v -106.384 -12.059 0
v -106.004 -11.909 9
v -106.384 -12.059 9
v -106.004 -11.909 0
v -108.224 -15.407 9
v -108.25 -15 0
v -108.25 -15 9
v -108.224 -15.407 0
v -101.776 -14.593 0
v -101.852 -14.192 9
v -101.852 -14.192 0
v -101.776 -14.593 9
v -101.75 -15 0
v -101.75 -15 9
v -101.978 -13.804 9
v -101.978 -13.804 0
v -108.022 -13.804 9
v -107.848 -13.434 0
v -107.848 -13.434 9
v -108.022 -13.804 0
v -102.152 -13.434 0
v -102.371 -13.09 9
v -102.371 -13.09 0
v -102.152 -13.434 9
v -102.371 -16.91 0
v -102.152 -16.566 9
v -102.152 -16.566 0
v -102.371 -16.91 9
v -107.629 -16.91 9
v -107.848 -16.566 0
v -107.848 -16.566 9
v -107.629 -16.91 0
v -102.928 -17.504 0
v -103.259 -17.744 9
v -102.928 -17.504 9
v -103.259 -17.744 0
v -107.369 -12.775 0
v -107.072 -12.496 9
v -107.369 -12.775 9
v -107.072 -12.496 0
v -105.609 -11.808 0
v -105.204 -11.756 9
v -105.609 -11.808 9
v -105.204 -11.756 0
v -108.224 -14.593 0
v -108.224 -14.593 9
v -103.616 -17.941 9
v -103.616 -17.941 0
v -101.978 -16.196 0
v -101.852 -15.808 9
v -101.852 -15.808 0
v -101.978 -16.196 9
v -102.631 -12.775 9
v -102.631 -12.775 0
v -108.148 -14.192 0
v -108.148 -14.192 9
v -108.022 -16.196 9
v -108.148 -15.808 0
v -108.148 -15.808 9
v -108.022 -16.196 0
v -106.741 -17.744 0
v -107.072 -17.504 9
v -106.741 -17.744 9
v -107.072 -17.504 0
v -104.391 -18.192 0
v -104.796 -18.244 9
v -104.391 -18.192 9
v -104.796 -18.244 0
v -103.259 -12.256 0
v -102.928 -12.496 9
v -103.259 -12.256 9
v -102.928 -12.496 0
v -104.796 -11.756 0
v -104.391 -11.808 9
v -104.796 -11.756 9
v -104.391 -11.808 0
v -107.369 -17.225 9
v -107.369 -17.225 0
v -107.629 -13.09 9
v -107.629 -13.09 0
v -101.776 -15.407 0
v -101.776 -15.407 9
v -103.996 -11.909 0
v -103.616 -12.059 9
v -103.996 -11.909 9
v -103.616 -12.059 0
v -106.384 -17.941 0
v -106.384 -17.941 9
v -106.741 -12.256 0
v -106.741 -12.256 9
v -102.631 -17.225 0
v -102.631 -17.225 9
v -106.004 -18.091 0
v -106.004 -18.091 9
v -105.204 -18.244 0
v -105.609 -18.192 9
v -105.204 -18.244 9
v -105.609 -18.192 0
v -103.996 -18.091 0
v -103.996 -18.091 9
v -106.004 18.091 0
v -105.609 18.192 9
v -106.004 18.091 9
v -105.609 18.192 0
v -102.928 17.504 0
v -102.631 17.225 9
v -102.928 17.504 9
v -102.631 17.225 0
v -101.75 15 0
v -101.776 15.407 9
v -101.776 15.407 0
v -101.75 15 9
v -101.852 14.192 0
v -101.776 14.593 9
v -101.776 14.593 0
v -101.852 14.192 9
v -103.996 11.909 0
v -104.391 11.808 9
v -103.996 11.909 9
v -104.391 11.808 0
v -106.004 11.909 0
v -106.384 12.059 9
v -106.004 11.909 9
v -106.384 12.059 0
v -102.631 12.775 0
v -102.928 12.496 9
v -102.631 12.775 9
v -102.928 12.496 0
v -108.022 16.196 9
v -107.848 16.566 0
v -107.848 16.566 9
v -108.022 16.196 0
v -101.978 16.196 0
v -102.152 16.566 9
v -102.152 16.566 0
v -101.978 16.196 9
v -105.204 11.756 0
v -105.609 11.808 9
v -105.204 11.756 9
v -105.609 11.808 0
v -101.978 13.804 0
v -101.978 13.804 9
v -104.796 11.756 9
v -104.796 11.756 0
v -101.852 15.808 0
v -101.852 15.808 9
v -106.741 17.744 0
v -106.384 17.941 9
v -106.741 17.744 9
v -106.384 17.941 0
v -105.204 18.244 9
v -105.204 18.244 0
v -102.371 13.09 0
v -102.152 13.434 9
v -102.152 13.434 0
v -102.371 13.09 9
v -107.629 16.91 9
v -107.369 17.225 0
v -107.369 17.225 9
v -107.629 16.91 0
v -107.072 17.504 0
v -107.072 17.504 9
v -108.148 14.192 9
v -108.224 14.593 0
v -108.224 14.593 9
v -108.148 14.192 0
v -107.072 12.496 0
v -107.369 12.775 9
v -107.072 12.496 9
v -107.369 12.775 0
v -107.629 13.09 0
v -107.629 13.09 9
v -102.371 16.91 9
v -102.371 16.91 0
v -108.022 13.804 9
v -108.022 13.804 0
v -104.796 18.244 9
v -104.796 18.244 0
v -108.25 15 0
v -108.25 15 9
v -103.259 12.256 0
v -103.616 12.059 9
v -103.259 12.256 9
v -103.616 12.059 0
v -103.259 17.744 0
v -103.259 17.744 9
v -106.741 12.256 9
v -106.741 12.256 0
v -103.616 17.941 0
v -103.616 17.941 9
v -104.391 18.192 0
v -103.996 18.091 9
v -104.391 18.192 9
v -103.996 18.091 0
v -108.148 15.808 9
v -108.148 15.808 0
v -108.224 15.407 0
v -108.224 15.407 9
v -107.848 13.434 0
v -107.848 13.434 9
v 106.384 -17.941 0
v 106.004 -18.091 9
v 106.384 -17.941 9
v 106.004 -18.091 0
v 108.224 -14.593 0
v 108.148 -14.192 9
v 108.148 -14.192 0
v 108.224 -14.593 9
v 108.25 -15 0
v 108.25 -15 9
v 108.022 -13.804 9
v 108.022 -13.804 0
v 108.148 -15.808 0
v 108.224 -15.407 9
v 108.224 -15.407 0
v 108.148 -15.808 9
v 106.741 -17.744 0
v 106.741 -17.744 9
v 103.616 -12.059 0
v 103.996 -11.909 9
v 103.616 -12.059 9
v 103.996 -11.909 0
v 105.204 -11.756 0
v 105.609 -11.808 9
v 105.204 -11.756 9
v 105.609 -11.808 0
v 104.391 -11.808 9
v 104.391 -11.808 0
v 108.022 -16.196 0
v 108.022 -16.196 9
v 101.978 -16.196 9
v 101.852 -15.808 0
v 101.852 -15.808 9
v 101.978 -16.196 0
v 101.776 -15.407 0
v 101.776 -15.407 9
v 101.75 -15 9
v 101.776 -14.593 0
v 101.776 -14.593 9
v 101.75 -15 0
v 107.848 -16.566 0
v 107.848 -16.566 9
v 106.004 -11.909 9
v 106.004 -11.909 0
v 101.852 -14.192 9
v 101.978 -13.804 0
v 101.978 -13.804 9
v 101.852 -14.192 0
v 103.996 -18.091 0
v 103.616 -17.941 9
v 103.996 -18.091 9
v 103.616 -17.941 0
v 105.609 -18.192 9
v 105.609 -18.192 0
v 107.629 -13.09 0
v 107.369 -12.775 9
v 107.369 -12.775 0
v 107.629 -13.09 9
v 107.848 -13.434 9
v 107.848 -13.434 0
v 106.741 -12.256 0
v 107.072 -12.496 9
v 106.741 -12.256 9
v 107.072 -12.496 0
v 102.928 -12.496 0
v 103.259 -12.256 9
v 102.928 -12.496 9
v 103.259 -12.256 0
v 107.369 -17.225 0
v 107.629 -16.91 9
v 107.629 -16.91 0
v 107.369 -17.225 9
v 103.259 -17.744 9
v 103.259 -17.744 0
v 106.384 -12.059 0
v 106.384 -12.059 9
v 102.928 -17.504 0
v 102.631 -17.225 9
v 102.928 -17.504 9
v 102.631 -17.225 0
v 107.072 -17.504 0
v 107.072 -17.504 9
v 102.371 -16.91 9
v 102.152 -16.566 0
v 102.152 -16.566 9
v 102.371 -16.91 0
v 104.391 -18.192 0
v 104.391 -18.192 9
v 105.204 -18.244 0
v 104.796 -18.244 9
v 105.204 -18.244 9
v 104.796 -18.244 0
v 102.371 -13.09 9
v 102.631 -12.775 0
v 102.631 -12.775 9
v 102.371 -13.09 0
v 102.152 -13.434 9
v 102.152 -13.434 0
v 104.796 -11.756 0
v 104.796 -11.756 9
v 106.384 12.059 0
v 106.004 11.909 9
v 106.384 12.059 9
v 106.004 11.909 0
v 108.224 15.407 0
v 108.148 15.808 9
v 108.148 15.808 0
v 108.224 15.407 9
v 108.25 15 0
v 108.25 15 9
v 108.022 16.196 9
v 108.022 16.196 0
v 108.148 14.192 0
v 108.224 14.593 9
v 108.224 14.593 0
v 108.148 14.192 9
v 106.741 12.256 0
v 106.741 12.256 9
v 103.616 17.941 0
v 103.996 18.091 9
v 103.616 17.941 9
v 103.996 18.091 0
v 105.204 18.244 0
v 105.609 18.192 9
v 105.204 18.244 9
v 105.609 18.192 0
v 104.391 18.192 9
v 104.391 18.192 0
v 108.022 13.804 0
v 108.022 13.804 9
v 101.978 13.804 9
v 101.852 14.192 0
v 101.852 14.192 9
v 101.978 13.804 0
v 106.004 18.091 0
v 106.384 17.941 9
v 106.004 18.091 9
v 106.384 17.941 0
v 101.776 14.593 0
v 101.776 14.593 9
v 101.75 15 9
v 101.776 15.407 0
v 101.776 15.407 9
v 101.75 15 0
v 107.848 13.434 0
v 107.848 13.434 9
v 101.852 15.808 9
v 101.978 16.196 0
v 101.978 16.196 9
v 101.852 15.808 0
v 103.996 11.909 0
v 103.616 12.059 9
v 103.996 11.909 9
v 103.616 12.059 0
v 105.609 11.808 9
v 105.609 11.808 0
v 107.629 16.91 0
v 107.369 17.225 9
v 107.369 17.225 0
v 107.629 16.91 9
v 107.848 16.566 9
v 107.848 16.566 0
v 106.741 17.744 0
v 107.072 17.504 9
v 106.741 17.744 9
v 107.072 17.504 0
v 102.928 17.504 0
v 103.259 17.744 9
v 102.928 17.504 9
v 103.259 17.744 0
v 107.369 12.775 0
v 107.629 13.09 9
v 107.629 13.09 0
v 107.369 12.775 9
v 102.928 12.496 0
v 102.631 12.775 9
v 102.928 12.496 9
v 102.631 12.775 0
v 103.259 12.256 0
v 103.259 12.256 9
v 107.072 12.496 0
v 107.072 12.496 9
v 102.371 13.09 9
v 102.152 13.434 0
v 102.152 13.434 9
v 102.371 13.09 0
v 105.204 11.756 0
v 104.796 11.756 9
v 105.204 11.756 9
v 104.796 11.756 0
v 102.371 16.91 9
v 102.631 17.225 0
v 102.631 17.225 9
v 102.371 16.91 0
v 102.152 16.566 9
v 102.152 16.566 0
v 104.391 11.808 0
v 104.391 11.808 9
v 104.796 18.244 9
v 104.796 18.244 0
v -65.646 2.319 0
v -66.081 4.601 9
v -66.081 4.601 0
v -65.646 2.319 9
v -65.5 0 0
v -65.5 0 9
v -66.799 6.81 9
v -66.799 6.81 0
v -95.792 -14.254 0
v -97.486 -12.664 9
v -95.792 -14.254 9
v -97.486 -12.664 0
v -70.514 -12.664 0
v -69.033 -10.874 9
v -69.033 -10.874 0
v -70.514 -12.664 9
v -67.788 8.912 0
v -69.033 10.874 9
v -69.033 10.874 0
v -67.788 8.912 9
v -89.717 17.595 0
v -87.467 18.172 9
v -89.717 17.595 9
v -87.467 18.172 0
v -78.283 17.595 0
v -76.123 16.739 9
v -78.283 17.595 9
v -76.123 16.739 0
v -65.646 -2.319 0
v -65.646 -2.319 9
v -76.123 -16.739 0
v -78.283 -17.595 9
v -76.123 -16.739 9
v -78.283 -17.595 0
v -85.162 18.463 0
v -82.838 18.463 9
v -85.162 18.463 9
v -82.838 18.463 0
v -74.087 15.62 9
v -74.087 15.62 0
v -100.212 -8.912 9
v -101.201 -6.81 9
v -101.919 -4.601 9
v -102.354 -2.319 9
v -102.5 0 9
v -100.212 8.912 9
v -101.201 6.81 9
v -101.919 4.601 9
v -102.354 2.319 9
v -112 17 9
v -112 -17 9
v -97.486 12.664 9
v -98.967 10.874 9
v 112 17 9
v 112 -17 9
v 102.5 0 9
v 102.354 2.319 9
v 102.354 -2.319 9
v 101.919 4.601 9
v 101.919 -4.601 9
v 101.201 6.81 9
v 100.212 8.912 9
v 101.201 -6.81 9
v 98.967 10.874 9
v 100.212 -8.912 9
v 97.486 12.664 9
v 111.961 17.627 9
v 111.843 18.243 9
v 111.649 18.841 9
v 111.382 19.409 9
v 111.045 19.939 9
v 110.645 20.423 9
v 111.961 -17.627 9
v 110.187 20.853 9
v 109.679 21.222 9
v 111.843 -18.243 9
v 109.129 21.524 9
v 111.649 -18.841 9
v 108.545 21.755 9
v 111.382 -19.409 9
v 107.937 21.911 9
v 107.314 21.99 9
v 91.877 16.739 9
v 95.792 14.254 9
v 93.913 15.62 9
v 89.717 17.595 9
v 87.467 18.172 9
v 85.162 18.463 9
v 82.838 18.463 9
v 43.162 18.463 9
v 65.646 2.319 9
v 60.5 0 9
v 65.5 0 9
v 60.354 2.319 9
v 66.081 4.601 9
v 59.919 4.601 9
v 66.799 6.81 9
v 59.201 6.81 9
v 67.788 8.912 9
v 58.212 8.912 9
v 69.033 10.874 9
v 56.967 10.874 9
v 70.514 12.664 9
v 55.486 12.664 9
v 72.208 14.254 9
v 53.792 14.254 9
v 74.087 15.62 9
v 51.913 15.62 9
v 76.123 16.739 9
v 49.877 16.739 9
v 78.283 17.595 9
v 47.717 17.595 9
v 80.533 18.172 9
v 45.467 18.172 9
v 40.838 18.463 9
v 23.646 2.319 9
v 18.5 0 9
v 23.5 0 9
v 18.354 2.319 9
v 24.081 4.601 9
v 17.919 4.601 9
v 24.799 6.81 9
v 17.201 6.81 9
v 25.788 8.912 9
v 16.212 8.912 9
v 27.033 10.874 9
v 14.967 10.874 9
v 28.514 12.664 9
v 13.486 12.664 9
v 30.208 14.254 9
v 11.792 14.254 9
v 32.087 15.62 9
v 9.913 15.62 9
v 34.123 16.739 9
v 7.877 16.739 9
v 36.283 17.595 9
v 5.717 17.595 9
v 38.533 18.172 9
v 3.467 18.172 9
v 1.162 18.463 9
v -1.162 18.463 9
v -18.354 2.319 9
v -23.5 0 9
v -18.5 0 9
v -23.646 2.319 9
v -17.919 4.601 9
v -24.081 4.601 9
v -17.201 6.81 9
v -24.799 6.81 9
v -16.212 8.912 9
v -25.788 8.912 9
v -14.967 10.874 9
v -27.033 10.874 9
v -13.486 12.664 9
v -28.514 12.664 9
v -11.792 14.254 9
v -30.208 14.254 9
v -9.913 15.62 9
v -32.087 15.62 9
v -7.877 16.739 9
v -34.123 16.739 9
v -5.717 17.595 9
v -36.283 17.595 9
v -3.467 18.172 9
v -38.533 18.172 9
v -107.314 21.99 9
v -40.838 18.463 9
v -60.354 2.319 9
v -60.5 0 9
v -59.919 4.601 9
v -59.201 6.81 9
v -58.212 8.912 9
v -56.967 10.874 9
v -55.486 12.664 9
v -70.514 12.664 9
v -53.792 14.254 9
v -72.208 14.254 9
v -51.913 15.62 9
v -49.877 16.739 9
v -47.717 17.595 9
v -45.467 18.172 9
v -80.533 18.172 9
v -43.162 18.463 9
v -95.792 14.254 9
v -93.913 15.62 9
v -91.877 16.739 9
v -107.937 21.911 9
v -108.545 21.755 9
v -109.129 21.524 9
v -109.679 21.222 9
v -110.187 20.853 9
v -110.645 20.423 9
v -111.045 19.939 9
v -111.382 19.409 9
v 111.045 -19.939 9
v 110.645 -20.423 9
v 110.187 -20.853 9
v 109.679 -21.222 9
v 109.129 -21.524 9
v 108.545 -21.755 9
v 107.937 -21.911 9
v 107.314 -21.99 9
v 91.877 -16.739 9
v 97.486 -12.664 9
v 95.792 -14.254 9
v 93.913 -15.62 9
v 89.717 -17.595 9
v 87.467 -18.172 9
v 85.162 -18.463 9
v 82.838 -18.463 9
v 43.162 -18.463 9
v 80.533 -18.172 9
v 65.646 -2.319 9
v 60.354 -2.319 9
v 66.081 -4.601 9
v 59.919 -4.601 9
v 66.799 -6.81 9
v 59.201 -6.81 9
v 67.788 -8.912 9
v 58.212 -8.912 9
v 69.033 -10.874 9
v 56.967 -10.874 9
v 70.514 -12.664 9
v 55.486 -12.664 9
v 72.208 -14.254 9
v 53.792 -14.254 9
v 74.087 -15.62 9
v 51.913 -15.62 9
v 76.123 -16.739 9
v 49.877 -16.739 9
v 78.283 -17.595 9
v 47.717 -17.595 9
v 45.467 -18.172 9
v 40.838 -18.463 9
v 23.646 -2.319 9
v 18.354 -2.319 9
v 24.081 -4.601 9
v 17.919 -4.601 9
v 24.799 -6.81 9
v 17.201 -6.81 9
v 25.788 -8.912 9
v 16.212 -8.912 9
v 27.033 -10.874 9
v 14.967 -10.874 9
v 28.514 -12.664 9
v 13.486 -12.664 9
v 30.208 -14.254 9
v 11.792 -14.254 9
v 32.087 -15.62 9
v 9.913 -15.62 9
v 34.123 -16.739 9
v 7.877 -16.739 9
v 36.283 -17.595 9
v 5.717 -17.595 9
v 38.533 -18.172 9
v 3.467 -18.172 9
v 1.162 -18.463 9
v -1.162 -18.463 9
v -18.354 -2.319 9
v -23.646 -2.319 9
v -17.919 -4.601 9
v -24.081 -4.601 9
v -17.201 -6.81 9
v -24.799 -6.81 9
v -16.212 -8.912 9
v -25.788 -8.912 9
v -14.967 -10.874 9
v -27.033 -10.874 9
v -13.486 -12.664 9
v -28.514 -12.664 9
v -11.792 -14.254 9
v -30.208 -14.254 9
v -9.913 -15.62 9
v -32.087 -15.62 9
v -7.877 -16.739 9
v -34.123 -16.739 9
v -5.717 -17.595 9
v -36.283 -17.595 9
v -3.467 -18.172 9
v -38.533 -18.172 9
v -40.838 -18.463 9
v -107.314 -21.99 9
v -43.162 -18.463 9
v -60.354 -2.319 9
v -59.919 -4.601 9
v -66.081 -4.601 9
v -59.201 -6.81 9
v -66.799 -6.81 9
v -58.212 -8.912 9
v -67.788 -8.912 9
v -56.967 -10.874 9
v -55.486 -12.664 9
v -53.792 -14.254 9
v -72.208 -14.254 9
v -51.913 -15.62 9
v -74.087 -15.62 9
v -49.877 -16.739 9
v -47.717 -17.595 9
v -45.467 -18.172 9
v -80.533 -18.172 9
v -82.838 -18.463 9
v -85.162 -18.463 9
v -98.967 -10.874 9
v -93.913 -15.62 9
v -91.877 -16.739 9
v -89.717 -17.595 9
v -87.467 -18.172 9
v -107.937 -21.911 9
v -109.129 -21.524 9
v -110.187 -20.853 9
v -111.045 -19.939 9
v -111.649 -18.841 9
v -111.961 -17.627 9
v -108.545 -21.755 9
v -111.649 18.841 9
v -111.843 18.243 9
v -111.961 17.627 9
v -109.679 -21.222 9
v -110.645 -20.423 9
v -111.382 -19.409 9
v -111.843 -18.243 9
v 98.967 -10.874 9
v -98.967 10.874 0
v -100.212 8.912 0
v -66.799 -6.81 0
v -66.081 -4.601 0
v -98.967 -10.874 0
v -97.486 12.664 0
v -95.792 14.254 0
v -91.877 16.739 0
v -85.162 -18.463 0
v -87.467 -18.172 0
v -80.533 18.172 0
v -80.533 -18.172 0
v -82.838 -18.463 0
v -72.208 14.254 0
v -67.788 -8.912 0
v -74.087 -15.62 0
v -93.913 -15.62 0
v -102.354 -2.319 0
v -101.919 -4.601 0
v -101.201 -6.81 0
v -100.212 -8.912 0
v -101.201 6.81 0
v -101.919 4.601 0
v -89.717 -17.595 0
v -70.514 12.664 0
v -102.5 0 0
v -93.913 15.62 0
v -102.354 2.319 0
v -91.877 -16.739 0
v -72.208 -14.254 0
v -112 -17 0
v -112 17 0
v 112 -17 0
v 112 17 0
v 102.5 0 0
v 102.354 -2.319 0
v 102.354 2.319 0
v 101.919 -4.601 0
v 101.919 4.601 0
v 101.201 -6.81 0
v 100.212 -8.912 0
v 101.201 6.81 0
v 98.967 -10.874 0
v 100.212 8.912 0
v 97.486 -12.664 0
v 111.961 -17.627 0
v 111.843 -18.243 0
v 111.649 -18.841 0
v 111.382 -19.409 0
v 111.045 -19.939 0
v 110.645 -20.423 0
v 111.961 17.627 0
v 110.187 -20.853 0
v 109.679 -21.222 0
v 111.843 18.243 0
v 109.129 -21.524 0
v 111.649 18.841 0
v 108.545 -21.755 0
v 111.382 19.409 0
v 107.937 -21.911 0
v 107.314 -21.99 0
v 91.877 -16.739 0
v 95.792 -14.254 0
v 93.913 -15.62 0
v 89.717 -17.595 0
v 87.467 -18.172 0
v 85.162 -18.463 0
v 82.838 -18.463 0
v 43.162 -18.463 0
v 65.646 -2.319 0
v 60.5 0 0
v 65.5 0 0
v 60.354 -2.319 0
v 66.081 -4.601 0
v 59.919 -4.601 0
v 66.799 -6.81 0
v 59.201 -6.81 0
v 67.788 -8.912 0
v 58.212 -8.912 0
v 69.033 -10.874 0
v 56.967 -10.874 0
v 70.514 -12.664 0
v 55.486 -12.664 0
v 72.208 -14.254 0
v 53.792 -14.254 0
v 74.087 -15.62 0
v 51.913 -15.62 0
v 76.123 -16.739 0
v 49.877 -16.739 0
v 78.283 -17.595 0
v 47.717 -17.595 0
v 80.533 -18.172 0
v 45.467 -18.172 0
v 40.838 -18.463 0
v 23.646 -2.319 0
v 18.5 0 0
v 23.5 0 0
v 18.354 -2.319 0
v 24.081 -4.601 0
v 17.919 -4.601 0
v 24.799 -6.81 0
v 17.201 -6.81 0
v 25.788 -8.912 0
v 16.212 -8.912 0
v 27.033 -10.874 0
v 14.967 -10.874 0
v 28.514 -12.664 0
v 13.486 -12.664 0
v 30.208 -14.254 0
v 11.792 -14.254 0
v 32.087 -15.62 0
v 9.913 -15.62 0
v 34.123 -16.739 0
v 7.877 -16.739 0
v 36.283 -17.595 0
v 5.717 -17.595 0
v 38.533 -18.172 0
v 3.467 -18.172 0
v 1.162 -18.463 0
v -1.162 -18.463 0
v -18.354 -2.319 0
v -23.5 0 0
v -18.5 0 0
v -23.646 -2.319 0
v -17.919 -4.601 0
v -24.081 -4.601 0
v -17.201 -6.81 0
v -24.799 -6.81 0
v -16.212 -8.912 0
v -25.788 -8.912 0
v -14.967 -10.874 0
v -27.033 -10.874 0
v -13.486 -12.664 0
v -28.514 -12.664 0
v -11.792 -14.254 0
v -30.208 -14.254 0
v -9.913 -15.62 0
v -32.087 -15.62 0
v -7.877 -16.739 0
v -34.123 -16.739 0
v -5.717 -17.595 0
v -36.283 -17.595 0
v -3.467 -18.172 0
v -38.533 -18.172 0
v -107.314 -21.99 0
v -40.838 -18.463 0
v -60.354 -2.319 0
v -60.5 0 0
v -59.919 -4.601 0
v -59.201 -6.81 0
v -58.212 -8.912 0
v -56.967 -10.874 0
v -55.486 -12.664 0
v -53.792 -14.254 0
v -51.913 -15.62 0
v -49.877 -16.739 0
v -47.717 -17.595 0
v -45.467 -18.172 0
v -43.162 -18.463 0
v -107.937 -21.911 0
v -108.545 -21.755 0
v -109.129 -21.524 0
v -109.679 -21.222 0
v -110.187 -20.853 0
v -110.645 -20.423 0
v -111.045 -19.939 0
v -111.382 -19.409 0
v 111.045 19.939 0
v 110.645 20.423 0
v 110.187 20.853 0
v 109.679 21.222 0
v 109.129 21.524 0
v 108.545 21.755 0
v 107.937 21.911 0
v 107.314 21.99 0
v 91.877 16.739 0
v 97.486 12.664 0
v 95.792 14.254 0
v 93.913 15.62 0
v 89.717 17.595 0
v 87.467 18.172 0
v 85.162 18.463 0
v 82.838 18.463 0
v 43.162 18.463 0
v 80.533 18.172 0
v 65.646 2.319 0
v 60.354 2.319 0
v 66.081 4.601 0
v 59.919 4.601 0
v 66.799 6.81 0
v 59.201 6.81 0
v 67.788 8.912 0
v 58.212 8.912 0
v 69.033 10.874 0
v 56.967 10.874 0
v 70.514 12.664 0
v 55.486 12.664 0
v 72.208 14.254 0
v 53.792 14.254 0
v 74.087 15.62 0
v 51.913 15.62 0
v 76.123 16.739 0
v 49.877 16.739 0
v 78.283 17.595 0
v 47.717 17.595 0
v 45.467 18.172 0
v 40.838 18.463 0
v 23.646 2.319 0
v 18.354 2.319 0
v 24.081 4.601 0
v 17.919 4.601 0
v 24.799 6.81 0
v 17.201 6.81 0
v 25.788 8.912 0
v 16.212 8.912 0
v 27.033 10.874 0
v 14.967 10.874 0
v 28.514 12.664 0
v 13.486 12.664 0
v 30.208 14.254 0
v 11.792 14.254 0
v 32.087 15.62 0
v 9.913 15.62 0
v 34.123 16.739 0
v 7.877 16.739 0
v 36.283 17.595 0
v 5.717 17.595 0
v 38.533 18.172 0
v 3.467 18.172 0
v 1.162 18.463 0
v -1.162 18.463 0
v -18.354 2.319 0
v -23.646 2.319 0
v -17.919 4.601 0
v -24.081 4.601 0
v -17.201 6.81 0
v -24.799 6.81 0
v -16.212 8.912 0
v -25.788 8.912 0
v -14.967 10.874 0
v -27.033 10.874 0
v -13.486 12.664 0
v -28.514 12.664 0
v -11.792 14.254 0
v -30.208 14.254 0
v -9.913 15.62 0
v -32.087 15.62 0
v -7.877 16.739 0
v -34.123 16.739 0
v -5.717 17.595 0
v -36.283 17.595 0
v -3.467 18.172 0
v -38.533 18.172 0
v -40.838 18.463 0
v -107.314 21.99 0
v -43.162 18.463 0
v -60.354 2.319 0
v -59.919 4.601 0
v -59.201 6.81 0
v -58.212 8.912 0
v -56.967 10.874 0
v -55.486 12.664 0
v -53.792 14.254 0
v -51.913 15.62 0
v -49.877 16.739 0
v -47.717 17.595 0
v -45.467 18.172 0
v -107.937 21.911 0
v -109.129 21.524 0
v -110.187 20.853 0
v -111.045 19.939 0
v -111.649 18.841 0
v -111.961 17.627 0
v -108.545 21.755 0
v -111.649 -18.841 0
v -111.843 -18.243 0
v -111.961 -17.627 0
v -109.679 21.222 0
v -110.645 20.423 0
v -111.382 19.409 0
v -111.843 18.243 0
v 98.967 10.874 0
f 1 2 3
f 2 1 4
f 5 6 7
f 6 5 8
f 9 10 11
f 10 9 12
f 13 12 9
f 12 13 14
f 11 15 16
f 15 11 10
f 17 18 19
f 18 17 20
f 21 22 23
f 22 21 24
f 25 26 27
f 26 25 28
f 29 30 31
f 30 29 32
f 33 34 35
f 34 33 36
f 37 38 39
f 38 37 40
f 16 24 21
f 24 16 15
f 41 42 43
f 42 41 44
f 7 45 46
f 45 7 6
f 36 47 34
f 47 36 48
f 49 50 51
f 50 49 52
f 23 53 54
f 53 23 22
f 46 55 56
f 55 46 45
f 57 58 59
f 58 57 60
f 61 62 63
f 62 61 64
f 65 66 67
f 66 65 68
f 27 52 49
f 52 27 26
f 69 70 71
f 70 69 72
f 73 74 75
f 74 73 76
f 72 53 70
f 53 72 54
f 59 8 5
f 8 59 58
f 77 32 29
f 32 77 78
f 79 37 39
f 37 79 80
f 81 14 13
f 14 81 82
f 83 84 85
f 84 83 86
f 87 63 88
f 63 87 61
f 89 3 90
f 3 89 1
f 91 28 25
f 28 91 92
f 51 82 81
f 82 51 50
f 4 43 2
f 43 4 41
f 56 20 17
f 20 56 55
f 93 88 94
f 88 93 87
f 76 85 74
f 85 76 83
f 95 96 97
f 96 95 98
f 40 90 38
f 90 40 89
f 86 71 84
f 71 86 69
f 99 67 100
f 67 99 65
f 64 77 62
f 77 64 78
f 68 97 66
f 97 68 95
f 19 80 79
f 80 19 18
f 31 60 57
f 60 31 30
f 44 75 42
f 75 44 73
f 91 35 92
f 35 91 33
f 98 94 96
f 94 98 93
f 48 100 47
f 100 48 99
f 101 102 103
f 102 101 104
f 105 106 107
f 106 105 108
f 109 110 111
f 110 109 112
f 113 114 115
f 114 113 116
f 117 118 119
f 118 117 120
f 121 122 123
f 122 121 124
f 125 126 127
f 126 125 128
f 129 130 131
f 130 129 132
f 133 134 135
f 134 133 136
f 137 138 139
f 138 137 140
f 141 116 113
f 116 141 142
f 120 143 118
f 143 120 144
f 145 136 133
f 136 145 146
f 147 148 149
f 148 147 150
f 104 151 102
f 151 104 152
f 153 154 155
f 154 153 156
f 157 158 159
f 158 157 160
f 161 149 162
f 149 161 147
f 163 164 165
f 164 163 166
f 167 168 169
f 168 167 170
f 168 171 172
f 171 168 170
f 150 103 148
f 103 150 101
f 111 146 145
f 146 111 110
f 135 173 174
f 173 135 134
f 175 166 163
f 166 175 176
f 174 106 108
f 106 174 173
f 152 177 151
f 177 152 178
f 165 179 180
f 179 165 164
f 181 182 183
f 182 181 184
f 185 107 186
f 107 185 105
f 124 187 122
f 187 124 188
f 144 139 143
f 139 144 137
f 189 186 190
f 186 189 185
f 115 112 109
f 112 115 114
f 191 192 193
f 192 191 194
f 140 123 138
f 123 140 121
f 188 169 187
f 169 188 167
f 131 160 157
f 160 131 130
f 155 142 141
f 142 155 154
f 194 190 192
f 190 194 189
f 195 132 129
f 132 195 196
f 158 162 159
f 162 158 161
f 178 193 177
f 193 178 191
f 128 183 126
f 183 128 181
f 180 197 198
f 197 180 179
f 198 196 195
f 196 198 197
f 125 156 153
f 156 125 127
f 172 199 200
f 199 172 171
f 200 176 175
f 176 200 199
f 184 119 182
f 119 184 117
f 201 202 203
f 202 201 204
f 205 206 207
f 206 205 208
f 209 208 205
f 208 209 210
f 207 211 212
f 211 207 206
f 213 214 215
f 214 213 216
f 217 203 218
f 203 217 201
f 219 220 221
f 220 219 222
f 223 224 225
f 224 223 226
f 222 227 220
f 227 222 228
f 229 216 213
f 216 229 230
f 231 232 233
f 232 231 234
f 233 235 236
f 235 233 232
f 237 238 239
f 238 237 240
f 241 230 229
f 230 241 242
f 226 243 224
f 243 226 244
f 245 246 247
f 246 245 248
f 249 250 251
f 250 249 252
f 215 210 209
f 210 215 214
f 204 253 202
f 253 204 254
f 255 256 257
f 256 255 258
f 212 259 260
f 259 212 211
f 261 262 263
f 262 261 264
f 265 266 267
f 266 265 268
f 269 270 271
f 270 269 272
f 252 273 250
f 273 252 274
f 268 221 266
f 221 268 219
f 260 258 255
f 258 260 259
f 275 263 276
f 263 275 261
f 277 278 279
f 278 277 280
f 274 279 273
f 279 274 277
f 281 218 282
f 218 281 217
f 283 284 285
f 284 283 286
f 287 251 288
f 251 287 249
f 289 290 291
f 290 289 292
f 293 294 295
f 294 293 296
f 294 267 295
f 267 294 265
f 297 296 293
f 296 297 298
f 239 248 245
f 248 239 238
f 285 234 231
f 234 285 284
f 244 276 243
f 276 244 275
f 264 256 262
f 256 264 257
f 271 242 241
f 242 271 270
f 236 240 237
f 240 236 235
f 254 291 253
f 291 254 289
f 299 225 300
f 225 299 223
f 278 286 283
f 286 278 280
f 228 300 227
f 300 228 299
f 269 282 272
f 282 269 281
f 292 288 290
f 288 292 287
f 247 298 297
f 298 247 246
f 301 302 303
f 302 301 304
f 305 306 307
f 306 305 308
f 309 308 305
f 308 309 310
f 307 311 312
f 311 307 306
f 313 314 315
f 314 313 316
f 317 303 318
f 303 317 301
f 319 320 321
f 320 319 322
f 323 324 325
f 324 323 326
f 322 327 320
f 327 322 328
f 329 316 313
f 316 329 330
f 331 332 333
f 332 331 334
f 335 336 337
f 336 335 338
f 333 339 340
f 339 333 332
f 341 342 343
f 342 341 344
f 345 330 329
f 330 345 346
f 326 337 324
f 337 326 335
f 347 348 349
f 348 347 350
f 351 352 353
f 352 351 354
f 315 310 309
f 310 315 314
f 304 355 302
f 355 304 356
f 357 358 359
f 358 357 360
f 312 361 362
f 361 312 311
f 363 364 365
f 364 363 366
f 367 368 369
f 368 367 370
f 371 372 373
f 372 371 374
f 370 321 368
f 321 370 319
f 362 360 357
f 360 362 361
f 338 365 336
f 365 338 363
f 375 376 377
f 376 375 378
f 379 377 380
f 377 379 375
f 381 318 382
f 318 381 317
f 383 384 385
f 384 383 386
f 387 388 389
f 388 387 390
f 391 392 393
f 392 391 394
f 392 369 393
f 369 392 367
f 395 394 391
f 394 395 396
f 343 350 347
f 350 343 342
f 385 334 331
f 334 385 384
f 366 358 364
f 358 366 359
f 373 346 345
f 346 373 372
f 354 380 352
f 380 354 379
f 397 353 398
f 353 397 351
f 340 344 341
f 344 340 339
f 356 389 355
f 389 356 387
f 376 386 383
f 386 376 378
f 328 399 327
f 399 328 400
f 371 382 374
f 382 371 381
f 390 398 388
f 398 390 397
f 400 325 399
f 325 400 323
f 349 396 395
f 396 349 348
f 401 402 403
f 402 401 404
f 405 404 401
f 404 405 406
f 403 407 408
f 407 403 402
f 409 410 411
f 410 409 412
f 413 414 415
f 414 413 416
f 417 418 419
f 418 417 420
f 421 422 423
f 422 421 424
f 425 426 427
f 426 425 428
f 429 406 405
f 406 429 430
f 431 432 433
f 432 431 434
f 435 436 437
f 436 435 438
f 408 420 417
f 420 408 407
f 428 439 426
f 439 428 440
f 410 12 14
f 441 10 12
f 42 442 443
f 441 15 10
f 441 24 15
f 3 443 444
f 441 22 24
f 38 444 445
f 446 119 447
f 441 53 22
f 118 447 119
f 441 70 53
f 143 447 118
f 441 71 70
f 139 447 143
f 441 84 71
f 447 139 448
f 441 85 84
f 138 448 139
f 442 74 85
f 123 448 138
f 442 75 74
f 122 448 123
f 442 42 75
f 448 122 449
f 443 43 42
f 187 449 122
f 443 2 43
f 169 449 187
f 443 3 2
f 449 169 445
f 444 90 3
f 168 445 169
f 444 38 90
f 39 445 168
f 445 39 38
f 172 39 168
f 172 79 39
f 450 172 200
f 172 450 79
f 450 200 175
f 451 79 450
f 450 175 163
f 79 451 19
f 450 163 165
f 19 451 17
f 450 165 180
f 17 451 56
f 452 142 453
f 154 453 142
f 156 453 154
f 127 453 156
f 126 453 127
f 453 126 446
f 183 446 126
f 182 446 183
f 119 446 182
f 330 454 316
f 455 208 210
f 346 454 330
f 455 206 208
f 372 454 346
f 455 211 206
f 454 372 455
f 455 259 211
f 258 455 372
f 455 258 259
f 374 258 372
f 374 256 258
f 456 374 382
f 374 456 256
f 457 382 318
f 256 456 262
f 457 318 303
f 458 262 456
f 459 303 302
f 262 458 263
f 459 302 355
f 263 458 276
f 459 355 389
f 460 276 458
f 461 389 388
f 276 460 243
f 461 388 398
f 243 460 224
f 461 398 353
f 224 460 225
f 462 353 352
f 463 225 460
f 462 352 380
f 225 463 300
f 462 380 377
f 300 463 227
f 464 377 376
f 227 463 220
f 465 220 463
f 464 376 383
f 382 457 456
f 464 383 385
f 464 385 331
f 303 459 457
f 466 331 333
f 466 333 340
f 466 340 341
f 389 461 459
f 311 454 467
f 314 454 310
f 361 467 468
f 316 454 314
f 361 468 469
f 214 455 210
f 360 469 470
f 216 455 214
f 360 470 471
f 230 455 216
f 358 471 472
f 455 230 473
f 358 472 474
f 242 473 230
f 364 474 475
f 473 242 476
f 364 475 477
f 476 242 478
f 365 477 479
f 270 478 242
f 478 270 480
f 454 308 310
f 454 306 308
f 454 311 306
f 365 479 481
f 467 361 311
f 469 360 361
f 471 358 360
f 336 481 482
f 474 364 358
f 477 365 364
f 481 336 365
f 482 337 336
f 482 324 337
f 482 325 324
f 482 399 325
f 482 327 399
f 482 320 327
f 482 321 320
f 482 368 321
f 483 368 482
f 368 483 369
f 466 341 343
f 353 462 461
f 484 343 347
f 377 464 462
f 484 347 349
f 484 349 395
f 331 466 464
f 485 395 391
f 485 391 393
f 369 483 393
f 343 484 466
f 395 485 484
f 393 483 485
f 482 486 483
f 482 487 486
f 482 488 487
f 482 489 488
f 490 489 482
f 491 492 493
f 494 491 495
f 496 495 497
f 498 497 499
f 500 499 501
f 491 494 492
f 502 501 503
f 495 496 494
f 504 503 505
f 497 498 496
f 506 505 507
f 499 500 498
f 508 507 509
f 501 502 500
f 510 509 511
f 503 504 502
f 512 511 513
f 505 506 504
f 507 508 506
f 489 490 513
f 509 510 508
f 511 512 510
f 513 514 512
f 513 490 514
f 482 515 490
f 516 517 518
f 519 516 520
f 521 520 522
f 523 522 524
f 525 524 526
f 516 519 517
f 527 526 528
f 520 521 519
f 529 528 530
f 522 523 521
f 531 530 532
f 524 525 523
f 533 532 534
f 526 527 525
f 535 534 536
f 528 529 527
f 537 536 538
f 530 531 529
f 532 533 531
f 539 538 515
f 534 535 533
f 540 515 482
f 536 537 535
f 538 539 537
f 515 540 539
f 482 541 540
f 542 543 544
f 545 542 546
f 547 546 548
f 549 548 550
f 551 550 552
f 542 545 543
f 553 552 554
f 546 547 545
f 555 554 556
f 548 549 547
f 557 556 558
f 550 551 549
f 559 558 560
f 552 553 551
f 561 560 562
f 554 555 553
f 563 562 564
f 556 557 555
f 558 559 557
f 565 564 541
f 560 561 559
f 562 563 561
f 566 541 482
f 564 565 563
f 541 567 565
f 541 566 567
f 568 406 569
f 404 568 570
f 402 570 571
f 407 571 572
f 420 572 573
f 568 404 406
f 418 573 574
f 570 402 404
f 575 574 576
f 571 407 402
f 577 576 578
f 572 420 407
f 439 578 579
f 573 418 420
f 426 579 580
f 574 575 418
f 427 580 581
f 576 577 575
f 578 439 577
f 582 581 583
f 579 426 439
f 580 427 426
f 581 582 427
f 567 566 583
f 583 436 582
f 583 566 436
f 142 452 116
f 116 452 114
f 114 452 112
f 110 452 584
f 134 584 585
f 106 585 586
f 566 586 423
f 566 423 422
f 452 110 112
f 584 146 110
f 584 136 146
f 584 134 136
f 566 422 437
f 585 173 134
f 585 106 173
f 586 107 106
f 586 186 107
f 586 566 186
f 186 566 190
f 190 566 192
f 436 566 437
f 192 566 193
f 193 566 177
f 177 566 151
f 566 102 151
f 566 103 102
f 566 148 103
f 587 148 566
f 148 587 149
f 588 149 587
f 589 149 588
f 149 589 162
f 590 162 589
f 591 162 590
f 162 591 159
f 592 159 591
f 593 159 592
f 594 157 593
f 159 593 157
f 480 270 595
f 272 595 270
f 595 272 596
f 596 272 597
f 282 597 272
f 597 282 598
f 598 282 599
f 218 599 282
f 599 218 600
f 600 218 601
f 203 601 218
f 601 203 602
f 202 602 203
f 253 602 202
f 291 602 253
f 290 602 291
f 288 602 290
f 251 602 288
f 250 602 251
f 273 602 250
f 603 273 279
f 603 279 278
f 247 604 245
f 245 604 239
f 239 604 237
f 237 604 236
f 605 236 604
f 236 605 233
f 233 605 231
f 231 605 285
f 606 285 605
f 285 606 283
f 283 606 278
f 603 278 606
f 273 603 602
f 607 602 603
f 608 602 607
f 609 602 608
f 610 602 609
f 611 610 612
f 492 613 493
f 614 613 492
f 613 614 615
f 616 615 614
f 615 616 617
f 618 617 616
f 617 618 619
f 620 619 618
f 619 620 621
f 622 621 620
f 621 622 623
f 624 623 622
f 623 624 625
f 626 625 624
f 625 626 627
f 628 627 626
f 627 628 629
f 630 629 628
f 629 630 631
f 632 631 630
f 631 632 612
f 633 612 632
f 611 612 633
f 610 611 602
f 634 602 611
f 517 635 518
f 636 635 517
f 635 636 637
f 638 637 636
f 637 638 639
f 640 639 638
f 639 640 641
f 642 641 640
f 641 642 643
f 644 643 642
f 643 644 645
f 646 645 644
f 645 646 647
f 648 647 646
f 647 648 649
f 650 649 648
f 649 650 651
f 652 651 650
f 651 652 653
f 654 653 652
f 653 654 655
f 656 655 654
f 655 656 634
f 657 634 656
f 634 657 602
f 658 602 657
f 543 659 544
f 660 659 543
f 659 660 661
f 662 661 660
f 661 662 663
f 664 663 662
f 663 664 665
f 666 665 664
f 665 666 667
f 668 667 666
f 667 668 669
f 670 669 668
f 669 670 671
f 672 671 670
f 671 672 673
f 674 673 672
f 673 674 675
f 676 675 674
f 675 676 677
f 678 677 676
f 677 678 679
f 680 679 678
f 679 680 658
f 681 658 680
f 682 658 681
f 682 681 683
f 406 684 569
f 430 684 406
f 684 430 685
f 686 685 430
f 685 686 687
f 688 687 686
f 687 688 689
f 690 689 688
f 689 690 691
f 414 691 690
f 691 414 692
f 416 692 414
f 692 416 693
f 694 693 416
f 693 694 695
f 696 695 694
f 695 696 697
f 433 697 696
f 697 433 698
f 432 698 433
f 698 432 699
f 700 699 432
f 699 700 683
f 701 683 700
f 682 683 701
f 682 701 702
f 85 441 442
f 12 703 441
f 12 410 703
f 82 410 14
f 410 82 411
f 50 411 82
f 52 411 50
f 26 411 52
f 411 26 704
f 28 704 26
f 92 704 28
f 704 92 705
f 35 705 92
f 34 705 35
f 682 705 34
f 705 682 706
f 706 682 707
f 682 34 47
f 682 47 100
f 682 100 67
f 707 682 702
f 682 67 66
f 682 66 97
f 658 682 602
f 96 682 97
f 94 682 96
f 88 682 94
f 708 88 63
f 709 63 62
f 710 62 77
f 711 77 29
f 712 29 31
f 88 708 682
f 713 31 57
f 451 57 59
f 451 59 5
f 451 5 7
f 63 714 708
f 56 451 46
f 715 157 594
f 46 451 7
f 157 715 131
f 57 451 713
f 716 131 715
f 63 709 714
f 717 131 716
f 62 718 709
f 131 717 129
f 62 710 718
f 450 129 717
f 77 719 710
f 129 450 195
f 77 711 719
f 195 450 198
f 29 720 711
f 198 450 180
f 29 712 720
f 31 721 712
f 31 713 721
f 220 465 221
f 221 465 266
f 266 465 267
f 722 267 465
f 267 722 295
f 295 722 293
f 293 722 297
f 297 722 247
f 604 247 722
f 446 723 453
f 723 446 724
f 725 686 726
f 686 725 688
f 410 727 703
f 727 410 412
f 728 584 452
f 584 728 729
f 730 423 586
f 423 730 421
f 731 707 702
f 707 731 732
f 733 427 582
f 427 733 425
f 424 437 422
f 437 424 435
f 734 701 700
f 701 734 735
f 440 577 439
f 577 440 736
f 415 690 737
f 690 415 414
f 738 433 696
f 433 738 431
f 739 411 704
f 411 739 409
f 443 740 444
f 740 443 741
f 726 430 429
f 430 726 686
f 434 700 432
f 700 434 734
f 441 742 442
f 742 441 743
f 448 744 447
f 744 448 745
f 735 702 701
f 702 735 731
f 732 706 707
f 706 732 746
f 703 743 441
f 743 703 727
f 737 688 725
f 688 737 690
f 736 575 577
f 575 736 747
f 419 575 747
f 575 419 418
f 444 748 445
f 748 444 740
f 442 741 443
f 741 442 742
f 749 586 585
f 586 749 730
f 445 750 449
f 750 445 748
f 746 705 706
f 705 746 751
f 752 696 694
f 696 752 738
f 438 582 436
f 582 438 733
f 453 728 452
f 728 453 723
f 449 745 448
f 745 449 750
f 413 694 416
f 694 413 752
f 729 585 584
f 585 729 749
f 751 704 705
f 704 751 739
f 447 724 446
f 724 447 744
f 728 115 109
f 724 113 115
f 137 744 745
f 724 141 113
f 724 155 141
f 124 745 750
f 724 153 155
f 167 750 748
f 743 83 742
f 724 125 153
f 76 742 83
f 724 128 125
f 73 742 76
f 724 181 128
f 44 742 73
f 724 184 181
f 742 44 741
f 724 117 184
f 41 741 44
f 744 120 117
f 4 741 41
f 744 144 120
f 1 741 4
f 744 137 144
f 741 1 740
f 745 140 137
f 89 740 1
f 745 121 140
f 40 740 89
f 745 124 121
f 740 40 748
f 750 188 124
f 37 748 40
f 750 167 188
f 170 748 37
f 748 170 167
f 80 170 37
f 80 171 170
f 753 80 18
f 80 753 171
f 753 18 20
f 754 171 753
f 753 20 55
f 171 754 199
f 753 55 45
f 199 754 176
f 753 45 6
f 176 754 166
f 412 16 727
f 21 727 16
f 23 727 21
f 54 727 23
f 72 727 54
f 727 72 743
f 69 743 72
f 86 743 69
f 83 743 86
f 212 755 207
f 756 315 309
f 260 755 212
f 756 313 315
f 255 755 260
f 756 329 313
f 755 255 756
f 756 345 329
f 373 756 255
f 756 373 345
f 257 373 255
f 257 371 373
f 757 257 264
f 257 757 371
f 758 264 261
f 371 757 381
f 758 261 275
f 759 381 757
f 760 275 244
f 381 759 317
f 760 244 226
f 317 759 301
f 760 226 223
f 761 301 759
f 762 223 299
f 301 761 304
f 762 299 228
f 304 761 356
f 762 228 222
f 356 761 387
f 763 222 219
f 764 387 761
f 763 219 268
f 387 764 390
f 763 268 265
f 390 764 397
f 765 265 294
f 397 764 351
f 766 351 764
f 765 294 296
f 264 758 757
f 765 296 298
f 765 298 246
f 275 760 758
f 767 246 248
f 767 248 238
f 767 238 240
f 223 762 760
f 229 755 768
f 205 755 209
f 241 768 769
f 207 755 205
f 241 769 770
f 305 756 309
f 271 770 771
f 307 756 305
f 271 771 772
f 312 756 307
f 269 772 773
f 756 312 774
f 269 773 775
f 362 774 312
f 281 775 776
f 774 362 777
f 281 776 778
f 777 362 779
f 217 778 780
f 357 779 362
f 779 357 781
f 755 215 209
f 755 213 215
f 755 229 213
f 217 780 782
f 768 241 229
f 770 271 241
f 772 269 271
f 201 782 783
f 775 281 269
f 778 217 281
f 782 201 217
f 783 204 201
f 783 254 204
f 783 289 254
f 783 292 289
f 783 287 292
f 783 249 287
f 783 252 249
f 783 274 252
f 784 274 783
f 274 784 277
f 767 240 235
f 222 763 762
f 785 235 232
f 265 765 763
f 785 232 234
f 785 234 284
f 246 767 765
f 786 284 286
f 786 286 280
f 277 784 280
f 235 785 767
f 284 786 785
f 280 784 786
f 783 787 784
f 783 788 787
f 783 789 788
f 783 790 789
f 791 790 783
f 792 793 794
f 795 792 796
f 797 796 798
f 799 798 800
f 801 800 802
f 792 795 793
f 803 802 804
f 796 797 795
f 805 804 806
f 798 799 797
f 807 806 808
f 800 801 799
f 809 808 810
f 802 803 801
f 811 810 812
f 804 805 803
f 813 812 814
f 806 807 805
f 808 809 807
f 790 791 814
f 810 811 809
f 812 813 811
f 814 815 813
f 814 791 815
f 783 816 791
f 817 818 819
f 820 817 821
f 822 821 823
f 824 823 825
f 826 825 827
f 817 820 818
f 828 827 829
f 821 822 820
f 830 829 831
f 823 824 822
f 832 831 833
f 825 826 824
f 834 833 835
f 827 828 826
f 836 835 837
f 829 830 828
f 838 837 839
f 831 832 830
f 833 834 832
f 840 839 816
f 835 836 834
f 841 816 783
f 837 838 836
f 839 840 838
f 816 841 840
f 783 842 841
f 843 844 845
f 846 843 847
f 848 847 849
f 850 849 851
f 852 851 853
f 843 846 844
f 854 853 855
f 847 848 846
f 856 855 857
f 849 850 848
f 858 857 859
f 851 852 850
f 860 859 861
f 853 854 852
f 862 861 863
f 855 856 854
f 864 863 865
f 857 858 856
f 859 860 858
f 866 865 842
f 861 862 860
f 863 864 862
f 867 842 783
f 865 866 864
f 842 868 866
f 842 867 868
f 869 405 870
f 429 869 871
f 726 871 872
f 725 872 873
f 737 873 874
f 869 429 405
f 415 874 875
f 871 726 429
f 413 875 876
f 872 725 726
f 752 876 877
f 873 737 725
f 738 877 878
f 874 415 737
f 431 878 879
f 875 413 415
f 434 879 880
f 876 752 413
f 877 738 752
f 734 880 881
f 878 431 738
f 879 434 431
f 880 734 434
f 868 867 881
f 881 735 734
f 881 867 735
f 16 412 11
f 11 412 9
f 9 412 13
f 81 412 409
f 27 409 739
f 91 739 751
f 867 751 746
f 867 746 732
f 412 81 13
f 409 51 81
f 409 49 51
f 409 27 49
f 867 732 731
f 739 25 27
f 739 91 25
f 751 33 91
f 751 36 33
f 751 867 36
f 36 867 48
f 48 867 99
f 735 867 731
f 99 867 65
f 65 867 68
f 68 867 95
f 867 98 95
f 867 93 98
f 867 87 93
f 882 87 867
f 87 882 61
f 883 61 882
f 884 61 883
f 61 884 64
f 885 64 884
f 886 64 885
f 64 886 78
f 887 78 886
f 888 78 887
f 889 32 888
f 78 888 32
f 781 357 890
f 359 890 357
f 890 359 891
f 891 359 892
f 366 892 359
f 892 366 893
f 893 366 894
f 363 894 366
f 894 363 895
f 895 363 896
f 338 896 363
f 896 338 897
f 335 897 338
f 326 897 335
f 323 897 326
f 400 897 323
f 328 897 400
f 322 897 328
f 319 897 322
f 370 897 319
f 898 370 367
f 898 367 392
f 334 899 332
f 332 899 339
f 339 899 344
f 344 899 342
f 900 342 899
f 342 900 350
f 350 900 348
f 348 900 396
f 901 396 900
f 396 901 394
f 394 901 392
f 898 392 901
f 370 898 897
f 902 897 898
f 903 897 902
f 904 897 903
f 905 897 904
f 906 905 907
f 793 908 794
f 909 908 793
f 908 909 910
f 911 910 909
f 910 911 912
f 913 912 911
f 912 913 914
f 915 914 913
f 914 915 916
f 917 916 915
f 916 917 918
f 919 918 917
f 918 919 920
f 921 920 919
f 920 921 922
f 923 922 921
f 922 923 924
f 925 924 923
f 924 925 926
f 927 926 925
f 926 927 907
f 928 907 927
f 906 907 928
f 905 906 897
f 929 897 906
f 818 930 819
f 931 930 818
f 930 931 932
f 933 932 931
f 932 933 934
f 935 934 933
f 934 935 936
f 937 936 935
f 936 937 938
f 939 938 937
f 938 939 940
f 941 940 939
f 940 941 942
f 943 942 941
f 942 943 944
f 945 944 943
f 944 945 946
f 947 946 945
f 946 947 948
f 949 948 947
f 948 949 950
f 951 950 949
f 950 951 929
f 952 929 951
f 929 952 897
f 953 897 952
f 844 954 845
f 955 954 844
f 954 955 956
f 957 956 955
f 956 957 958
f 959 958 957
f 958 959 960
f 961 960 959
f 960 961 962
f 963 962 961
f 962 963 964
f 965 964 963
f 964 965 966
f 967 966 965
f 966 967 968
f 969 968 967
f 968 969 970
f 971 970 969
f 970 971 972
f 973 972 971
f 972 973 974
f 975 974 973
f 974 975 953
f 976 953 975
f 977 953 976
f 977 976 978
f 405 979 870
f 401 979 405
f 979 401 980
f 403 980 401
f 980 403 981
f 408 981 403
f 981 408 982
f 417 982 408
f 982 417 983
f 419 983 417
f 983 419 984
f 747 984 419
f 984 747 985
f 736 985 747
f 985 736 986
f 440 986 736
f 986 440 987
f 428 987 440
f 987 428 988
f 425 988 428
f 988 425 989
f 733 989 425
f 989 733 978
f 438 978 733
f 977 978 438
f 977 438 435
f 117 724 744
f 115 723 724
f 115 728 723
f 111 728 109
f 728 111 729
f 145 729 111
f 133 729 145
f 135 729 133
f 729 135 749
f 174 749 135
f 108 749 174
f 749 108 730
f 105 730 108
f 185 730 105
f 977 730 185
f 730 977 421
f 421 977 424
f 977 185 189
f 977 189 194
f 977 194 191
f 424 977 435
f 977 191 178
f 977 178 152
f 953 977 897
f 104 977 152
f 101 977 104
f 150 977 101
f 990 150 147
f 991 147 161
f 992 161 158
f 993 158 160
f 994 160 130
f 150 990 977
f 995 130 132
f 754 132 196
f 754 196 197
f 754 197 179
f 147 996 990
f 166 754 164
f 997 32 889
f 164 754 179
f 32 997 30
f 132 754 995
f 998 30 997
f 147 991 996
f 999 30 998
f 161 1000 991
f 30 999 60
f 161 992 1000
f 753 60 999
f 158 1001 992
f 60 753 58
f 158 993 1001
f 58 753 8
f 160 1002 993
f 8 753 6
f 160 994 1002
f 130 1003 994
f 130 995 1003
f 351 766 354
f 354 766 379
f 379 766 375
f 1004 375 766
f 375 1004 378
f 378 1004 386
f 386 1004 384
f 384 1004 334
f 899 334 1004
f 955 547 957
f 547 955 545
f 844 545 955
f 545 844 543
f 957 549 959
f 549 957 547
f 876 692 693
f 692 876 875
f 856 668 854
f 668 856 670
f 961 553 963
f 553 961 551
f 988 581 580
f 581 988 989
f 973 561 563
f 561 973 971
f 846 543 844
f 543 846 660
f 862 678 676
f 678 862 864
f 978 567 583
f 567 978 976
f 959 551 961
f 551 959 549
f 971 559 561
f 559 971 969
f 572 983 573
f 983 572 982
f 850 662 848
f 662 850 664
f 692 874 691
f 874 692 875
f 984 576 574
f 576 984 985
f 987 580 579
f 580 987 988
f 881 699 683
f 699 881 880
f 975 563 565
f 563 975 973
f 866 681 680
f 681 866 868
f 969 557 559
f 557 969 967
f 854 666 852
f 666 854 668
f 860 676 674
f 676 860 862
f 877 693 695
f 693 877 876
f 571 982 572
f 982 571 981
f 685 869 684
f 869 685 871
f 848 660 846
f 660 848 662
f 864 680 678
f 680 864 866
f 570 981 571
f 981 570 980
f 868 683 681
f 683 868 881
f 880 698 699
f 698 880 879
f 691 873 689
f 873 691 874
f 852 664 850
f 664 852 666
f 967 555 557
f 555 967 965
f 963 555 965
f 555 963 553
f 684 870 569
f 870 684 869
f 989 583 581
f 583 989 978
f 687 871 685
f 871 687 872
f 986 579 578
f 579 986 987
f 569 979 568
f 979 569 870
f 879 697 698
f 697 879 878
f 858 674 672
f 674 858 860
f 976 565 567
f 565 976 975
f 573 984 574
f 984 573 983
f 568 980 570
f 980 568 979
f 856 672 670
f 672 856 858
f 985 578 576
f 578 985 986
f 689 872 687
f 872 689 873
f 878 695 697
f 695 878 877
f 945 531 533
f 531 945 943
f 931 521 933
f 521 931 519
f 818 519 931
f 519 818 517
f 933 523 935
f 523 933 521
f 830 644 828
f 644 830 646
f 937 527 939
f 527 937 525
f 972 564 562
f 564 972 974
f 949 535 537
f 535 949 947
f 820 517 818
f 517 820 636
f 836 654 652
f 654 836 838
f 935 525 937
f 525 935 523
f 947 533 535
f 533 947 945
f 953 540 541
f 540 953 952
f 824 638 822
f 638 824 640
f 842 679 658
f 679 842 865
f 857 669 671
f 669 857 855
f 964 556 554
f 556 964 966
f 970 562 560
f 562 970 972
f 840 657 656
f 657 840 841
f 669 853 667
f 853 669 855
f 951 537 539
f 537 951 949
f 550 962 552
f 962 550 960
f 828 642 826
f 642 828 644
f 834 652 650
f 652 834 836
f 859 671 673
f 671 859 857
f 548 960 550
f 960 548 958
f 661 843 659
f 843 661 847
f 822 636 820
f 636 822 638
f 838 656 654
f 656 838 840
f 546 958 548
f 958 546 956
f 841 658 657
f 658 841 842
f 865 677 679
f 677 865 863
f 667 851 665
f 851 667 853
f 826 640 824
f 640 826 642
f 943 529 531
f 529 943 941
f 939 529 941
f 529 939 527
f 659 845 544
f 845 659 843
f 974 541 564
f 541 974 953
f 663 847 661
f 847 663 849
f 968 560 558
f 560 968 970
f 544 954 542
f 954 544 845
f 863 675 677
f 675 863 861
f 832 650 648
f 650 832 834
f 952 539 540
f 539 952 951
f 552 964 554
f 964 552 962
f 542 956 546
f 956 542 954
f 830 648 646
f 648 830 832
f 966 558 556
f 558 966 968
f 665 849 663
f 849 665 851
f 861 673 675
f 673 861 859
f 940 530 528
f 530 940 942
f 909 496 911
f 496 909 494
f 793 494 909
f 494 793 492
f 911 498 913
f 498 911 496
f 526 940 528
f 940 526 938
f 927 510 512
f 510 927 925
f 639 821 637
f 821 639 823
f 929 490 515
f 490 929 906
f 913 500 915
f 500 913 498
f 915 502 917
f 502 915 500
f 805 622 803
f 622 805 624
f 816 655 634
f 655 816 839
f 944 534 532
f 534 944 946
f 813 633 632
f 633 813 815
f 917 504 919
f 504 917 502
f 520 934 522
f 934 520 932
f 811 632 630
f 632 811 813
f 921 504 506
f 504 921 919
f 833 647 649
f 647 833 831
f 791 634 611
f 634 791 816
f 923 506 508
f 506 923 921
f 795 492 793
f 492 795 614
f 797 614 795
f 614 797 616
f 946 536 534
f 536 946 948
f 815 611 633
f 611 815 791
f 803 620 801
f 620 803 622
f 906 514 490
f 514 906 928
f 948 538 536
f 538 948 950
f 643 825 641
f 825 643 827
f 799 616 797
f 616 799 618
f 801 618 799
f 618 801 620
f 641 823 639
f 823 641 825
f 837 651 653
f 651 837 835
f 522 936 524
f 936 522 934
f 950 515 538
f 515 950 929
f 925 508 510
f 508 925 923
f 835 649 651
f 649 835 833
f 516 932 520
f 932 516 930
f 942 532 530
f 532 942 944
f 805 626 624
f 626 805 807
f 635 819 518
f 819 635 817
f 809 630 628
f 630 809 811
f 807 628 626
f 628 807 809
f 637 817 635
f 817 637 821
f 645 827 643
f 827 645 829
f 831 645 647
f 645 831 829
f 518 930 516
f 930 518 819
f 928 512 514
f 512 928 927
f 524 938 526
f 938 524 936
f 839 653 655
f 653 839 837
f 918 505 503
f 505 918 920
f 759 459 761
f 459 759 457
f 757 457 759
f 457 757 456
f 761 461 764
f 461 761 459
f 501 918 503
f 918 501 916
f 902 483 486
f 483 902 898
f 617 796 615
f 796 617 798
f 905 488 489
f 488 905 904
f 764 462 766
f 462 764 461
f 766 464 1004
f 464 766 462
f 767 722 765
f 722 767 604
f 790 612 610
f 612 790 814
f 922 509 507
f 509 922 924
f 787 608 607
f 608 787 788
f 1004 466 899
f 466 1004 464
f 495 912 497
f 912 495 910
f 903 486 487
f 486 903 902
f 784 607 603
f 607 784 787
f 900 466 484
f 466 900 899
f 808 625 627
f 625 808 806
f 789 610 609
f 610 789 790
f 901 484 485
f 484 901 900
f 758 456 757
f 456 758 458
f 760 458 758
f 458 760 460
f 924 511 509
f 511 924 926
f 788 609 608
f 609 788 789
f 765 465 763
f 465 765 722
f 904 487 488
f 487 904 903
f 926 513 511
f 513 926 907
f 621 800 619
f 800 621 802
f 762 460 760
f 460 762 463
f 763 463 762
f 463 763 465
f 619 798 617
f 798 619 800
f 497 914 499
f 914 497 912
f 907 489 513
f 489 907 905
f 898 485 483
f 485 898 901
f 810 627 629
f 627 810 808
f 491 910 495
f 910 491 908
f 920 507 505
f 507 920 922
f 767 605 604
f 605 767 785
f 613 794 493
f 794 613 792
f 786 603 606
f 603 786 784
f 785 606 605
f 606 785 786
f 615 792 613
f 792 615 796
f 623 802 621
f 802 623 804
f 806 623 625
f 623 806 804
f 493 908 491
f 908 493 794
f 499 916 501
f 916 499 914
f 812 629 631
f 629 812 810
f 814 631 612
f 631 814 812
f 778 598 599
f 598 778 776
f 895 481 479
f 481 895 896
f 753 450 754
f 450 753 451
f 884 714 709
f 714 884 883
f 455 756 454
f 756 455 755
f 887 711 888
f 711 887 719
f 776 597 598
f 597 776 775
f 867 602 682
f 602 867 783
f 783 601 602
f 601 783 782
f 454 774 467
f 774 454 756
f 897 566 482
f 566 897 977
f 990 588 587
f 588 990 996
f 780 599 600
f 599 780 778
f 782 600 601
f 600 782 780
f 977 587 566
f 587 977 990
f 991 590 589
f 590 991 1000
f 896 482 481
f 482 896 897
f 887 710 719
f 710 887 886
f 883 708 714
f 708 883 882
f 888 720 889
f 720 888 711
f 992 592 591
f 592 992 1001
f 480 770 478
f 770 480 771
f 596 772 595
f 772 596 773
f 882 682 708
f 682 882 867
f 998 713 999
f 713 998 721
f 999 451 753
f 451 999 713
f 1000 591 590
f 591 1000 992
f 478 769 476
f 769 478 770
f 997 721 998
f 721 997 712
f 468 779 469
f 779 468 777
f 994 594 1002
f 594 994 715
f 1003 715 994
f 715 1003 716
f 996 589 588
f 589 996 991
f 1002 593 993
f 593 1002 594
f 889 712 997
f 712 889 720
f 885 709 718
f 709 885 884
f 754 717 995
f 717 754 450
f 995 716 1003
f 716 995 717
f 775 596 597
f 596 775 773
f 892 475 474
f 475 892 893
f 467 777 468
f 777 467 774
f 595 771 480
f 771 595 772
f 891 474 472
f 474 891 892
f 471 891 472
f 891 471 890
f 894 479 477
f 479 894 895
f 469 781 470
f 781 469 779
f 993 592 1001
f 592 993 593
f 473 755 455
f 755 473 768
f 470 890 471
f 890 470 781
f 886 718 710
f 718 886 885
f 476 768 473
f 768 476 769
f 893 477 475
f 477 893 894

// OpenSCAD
$fn = 50;


difference() {
	union() {
		hull() {
			translate(v = [-107.0000000000, 17.0000000000, 0]) {
				cylinder(h = 9, r = 5);
			}
			translate(v = [107.0000000000, 17.0000000000, 0]) {
				cylinder(h = 9, r = 5);
			}
			translate(v = [-107.0000000000, -17.0000000000, 0]) {
				cylinder(h = 9, r = 5);
			}
			translate(v = [107.0000000000, -17.0000000000, 0]) {
				cylinder(h = 9, r = 5);
			}
		}
	}
	union() {
		#translate(v = [-105.0000000000, -15.0000000000, -100.0000000000]) {
			cylinder(h = 200, r = 3.2500000000);
		}
		#translate(v = [-105.0000000000, 15.0000000000, -100.0000000000]) {
			cylinder(h = 200, r = 3.2500000000);
		}
		#translate(v = [105.0000000000, -15.0000000000, -100.0000000000]) {
			cylinder(h = 200, r = 3.2500000000);
		}
		#translate(v = [105.0000000000, 15.0000000000, -100.0000000000]) {
			cylinder(h = 200, r = 3.2500000000);
		}
		#translate(v = [-84.0000000000, 0, 0]) {
			cylinder(h = 9, r = 18.5000000000);
		}
		#translate(v = [-42.0000000000, 0, 0]) {
			cylinder(h = 9, r = 18.5000000000);
		}
		#cylinder(h = 9, r = 18.5000000000);
		#translate(v = [42.0000000000, 0, 0]) {
			cylinder(h = 9, r = 18.5000000000);
		}
		#translate(v = [84.0000000000, 0, 0]) {
			cylinder(h = 9, r = 18.5000000000);
		}
	}
}
